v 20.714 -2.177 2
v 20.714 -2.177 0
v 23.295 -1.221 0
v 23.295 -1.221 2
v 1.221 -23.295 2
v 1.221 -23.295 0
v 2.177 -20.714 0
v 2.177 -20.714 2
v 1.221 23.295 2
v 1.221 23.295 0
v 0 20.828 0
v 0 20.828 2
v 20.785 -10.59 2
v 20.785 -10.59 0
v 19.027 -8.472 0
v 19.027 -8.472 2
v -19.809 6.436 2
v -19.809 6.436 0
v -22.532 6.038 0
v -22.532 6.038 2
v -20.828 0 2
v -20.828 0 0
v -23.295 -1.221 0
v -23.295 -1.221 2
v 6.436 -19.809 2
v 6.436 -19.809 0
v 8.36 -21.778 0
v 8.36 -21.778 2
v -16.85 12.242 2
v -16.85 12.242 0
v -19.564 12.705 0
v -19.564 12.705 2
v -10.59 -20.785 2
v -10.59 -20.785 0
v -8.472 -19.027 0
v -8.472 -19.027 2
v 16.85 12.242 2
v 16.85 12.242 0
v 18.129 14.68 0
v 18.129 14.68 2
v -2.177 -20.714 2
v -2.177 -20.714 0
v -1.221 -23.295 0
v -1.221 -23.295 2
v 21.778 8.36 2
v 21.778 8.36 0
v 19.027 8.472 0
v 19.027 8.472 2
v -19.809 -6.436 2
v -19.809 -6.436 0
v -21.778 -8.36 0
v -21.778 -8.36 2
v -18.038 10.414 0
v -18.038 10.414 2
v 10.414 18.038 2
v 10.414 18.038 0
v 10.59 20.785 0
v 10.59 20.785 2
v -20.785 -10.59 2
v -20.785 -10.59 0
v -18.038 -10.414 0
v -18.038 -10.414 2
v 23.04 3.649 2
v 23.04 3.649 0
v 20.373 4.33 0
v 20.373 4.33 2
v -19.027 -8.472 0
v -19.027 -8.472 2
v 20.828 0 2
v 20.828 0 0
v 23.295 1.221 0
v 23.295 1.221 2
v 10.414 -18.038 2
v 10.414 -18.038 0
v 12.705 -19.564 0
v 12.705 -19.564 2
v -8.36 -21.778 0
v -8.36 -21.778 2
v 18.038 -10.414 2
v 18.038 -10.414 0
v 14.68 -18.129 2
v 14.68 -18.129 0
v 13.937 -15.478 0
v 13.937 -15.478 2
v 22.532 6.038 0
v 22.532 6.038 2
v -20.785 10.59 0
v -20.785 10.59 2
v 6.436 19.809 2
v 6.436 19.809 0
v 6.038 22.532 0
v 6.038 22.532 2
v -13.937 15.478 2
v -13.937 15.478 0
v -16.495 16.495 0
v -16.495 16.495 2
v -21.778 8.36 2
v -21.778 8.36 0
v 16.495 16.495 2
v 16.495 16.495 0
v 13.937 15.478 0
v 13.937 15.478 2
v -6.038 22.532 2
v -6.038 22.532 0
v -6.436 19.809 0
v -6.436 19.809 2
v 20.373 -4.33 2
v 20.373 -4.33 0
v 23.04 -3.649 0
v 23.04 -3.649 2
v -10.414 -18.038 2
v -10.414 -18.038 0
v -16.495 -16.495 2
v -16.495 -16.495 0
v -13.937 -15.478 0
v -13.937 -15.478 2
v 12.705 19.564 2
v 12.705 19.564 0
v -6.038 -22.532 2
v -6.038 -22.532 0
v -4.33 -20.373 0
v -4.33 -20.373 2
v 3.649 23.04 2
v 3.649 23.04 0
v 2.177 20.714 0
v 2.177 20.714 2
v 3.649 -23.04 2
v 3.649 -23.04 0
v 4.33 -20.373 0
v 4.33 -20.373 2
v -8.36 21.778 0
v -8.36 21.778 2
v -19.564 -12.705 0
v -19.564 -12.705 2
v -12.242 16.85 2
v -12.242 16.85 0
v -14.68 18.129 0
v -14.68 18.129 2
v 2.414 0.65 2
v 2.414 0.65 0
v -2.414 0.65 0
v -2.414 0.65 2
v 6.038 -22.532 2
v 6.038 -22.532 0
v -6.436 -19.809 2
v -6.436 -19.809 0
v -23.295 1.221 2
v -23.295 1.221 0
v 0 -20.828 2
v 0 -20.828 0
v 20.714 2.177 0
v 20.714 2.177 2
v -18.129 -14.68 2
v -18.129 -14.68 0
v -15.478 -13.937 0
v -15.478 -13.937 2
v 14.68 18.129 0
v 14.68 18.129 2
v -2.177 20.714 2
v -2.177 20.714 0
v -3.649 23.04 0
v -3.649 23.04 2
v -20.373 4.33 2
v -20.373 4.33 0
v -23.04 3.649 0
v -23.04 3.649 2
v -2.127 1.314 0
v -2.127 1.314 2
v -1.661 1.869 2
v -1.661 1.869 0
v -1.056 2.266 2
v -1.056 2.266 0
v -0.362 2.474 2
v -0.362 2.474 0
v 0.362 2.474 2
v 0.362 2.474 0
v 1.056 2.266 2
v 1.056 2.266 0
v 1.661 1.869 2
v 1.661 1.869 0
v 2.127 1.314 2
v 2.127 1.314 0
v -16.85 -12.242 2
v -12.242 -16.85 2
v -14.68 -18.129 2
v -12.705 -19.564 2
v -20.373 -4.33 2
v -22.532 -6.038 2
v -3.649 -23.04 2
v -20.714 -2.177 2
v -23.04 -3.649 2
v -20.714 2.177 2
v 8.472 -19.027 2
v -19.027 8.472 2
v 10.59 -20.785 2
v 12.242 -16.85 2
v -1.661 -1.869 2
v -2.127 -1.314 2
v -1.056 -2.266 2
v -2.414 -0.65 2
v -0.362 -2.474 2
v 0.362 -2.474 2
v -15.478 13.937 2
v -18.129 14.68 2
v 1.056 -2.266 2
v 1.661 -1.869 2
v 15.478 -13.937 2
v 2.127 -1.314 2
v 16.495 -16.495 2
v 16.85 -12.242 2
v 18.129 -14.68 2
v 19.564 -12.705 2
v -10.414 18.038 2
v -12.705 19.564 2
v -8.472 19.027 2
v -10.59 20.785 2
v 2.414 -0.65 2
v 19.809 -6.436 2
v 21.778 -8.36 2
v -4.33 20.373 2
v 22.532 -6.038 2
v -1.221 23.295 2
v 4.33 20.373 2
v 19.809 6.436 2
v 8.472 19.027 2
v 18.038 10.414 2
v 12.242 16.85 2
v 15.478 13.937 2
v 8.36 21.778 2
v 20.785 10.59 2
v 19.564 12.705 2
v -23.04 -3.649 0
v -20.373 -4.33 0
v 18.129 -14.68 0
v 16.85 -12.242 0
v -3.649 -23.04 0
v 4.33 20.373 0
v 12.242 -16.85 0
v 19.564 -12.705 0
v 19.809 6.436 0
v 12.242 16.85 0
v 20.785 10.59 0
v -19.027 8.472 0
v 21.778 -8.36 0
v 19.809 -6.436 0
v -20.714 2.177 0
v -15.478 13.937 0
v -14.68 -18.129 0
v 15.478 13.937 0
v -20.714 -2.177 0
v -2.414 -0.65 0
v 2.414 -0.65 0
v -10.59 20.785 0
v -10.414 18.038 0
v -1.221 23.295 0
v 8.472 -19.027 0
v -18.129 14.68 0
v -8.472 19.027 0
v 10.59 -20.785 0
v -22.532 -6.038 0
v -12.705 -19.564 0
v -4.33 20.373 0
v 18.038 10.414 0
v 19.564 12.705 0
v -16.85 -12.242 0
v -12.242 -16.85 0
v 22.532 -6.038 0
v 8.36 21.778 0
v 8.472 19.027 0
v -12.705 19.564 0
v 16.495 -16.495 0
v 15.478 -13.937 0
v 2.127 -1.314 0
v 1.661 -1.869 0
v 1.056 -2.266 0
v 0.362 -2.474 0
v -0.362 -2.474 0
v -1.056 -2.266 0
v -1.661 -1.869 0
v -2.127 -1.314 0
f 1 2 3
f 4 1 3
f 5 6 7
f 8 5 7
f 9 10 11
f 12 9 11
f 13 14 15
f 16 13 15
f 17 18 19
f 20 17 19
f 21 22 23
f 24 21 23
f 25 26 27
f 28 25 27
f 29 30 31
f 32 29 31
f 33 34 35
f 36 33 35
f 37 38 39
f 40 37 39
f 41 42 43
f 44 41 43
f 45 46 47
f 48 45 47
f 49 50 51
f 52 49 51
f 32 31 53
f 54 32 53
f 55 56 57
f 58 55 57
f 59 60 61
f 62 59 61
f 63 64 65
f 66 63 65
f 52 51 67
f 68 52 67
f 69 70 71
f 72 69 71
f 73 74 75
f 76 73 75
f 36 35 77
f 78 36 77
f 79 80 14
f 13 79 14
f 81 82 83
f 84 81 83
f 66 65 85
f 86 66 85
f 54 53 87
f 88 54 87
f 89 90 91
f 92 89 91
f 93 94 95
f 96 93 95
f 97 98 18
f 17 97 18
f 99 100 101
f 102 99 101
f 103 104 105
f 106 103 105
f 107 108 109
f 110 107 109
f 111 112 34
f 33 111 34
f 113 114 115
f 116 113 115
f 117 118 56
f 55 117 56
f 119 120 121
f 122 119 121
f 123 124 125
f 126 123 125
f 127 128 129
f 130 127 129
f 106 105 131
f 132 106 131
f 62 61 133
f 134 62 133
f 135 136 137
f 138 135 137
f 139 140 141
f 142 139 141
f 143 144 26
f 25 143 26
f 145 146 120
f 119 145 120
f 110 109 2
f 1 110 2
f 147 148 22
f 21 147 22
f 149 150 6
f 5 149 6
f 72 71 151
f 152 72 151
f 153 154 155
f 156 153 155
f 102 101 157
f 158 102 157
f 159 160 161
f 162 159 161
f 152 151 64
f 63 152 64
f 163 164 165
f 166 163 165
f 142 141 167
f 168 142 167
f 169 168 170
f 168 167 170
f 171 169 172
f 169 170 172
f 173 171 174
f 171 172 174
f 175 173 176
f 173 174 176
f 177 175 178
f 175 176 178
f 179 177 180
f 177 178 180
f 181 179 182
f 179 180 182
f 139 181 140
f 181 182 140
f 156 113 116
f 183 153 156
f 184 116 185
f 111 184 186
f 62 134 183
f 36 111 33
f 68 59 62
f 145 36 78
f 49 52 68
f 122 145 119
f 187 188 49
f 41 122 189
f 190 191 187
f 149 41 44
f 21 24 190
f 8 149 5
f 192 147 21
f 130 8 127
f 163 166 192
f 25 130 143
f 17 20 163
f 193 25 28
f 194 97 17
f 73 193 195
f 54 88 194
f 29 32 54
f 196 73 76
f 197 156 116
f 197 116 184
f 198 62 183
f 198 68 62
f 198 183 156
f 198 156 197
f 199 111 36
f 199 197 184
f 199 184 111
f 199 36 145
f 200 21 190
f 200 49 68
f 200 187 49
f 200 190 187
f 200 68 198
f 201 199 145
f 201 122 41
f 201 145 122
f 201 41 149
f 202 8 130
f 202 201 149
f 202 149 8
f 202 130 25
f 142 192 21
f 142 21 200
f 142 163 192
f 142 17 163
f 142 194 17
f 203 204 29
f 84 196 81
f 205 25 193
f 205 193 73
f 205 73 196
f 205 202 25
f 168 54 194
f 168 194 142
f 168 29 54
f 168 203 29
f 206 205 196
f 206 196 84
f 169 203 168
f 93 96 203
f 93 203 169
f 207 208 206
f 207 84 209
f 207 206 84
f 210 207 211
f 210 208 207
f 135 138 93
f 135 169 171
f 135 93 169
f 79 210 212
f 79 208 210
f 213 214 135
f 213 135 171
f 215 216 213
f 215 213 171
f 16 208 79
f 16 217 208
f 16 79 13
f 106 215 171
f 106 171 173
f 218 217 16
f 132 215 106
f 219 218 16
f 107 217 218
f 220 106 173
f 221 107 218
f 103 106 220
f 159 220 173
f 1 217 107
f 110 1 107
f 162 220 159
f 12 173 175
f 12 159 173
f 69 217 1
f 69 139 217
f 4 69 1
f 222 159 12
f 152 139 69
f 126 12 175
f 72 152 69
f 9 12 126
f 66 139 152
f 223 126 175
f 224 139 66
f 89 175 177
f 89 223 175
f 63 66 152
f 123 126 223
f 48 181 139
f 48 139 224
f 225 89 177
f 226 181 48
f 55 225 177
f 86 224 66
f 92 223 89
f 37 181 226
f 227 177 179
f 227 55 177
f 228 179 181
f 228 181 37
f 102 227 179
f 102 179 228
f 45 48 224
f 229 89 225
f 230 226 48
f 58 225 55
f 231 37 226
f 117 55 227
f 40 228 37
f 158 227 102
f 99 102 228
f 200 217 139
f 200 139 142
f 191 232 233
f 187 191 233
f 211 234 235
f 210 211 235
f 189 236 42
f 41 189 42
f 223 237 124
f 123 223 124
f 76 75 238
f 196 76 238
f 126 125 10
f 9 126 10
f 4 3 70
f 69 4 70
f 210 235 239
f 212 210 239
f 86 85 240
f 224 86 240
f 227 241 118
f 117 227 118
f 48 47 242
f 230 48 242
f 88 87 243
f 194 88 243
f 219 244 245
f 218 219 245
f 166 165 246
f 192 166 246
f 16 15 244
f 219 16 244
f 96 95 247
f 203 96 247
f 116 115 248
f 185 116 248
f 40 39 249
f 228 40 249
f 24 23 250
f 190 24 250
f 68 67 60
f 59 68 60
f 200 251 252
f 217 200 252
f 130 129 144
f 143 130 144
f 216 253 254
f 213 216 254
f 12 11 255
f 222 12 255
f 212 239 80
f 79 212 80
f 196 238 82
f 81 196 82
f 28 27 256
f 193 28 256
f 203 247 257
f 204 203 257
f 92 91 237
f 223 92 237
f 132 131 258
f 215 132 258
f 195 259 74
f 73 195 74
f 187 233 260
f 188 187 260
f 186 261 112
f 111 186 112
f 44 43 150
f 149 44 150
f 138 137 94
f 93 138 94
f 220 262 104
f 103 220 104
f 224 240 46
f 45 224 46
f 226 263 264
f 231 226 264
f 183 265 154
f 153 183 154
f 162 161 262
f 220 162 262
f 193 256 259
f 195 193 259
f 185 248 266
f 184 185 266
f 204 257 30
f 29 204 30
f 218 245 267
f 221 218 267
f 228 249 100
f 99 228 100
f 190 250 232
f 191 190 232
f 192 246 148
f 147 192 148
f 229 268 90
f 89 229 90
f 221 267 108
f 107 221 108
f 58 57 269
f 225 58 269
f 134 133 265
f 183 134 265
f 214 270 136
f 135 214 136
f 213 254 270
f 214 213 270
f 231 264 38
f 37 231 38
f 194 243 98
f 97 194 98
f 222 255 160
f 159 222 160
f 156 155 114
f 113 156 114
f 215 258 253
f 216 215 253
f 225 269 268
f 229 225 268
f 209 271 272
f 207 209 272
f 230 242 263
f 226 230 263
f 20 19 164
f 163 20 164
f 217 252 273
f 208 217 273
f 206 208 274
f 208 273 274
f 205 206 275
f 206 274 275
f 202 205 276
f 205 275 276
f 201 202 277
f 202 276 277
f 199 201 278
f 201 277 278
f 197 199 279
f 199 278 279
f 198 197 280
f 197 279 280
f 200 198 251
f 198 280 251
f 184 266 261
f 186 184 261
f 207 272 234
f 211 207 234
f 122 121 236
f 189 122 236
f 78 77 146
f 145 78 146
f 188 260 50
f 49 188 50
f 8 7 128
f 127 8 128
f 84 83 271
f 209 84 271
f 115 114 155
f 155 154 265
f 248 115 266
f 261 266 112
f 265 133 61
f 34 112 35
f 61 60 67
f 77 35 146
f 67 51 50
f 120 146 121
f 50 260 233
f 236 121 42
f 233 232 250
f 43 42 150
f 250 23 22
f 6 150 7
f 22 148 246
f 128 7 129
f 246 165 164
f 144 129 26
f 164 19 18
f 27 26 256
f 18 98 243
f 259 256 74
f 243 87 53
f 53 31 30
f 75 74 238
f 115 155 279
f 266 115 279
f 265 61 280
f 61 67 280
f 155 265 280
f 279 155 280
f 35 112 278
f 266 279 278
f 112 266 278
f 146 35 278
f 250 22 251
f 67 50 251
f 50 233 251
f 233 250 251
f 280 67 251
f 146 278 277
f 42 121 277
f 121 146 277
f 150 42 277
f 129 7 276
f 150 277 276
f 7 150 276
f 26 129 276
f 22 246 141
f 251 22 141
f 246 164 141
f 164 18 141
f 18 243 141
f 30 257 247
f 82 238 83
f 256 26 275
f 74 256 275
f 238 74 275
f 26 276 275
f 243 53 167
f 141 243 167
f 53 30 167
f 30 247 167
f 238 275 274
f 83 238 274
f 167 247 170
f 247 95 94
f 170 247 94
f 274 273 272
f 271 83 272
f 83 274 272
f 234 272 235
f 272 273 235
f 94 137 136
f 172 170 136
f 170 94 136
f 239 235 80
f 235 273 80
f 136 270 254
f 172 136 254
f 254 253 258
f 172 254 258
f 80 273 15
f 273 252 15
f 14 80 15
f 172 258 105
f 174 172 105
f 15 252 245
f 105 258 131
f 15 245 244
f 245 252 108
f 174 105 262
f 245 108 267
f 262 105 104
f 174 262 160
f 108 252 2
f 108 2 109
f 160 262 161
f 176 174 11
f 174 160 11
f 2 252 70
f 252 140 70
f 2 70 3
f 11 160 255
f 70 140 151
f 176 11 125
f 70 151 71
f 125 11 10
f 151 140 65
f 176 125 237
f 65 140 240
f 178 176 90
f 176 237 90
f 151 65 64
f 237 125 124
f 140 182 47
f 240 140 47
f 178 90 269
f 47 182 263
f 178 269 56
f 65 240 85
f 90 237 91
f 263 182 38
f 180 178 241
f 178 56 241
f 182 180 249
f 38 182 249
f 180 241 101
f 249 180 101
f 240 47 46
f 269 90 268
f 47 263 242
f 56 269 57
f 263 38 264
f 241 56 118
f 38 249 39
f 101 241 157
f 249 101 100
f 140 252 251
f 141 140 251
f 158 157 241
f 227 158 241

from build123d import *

# Parameters (mm, degrees)
F1_DEPTH = 2


with BuildPart() as f1:
    # F0 (on Top) → F1 (new body)
    with BuildSketch(Plane.XY):
        Polygon((1.220858, 23.295364), (0, 20.827976), (-1.220858, 23.295364), (-2.177116, 20.713879), (-3.649199, 23.040135), (-4.33038, 20.372835), (-6.037558, 22.532474), (-6.436199, 19.808583), (-8.359769, 21.777942), (-8.471501, 19.027303), (-10.590388, 20.784806), (-10.413988, 18.037557), (-12.704976, 19.563948), (-12.242377, 16.850187), (-14.680367, 18.128743), (-13.936636, 15.478203), (-16.494916, 16.494916), (-15.478203, 13.936636), (-18.128743, 14.680367), (-16.850187, 12.242377), (-19.563948, 12.704976), (-18.037557, 10.413988), (-20.784806, 10.590388), (-19.027303, 8.471501), (-21.777942, 8.359769), (-19.808583, 6.436199), (-22.532474, 6.037558), (-20.372835, 4.33038), (-23.040135, 3.649199), (-20.713879, 2.177116), (-23.295364, 1.220858), (-20.827976, 0), (-23.295364, -1.220858), (-20.713879, -2.177116), (-23.040135, -3.649199), (-20.372835, -4.33038), (-22.532474, -6.037558), (-19.808583, -6.436199), (-21.777942, -8.359769), (-19.027303, -8.471501), (-20.784806, -10.590388), (-18.037557, -10.413988), (-19.563948, -12.704976), (-16.850187, -12.242377), (-18.128743, -14.680367), (-15.478203, -13.936636), (-16.494916, -16.494916), (-13.936636, -15.478203), (-14.680367, -18.128743), (-12.242377, -16.850187), (-12.704976, -19.563948), (-10.413988, -18.037557), (-10.590388, -20.784806), (-8.471501, -19.027303), (-8.359769, -21.777942), (-6.436199, -19.808583), (-6.037558, -22.532474), (-4.33038, -20.372835), (-3.649199, -23.040135), (-2.177116, -20.713879), (-1.220858, -23.295364), (0, -20.827976), (1.220858, -23.295364), (2.177116, -20.713879), (3.649199, -23.040135), (4.33038, -20.372835), (6.037558, -22.532474), (6.436199, -19.808583), (8.359769, -21.777942), (8.471501, -19.027303), (10.590388, -20.784806), (10.413988, -18.037557), (12.704976, -19.563948), (12.242377, -16.850187), (14.680367, -18.128743), (13.936636, -15.478203), (16.494916, -16.494916), (15.478203, -13.936636), (18.128743, -14.680367), (16.850187, -12.242377), (19.563948, -12.704976), (18.037557, -10.413988), (20.784806, -10.590388), (19.027303, -8.471501), (21.777942, -8.359769), (19.808583, -6.436199), (22.532474, -6.037558), (20.372835, -4.33038), (23.040135, -3.649199), (20.713879, -2.177116), (23.295364, -1.220858), (20.827976, 0), (23.295364, 1.220858), (20.713879, 2.177116), (23.040135, 3.649199), (20.372835, 4.33038), (22.532474, 6.037558), (19.808583, 6.436199), (21.777942, 8.359769), (19.027303, 8.471501), (20.784806, 10.590388), (18.037557, 10.413988), (19.563948, 12.704976), (16.850187, 12.242377), (18.128743, 14.680367), (15.478203, 13.936636), (16.494916, 16.494916), (13.936636, 15.478203), (14.680367, 18.128743), (12.242377, 16.850187), (12.704976, 19.563948), (10.413988, 18.037557), (10.590388, 20.784806), (8.471501, 19.027303), (8.359769, 21.777942), (6.436199, 19.808583), (6.037558, 22.532474), (4.33038, 20.372835), (3.649199, 23.040135), (2.177116, 20.713879), align=None)
        with BuildLine():
            Line((-2.414022, -0.65), (2.414022, -0.65))
            ThreePointArc((2.414022, -0.65), (0, -2.5), (-2.414022, -0.65))
        make_face(mode=Mode.SUBTRACT)
        with BuildLine():
            ThreePointArc((-2.414022, 0.65), (0, 2.5), (2.414022, 0.65))
            Line((2.414022, 0.65), (-2.414022, 0.65))
        make_face(mode=Mode.SUBTRACT)
    extrude(amount=F1_DEPTH)


solid = f1.part
